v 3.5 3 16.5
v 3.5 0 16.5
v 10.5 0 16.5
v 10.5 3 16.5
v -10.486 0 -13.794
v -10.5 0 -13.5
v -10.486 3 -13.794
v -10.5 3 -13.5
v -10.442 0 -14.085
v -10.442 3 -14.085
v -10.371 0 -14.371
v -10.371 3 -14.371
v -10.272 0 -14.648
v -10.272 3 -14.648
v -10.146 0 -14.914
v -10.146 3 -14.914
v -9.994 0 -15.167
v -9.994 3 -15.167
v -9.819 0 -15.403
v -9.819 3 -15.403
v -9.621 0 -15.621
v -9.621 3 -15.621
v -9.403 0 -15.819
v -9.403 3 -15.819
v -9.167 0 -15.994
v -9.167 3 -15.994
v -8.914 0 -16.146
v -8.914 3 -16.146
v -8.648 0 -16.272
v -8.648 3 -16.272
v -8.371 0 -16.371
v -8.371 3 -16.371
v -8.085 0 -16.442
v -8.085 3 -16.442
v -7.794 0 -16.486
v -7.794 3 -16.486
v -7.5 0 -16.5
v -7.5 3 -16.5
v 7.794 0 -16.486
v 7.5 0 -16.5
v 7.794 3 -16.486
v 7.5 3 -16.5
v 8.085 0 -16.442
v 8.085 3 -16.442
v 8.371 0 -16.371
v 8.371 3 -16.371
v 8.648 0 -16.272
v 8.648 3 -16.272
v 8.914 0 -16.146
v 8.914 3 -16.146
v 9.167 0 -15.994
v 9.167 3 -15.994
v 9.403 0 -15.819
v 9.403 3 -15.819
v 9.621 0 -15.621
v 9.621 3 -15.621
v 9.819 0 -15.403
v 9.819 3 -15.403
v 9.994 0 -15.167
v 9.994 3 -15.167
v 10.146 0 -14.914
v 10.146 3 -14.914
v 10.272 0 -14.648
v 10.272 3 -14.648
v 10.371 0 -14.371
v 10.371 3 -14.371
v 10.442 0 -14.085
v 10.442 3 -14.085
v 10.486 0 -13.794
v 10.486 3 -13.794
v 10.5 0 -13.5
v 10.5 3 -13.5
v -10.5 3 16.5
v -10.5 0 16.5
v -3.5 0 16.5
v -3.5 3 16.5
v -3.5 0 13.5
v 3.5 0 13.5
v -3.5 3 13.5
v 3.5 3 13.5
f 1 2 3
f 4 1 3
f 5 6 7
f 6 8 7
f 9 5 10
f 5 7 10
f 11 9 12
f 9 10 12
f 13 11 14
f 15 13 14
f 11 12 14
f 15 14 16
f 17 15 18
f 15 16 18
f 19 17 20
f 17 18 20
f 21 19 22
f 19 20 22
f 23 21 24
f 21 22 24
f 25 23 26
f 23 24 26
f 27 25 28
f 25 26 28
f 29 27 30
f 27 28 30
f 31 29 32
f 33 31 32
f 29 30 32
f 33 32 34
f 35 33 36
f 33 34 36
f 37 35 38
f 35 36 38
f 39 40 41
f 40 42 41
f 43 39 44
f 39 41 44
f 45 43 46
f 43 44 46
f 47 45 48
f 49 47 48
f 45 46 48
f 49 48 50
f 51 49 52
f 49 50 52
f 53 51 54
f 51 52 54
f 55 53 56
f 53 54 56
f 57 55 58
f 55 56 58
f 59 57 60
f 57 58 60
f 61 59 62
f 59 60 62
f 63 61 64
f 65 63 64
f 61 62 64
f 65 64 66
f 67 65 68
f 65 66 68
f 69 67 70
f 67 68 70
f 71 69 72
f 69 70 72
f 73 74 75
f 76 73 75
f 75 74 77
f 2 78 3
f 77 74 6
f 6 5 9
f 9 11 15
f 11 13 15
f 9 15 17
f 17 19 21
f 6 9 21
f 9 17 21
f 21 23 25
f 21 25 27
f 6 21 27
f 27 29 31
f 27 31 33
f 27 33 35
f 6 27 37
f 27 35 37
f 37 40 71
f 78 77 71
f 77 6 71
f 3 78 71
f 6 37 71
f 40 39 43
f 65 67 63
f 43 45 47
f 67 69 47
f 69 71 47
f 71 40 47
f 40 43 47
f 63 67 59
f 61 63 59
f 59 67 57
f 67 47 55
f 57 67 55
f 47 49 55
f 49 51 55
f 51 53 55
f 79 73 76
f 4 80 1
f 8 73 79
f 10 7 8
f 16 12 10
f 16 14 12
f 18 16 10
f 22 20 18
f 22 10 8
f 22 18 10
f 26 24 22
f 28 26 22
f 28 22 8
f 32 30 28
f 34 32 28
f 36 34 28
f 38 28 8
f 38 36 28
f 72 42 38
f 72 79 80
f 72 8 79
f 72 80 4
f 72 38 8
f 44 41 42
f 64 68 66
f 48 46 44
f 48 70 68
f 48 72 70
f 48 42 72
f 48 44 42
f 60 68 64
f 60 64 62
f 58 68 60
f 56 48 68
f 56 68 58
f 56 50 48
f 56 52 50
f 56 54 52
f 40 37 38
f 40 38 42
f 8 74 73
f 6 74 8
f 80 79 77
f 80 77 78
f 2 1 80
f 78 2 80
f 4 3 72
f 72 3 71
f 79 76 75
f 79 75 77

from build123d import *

# Parameters (mm, degrees)
SKETCH2_W           = 21
SKETCH2_H           = 33
BOSS_EXTRUDE1_DEPTH = 3
SKETCH4_W           = 7
SKETCH4_H           = 3
CUT_EXTRUDE2_DEPTH  = 3
FILLET1_R           = 3
FILLET2_R           = 3


with BuildPart() as part:
    # Sketch2 → Boss-Extrude1 (new body)
    with BuildSketch(Plane(origin=(0, 0, 0), x_dir=(1, 0, 0), z_dir=(0, 1, 0))):
        Rectangle(SKETCH2_W, SKETCH2_H)
    extrude(amount=BOSS_EXTRUDE1_DEPTH)

    # Sketch4 → Cut-Extrude2 (cut)
    with BuildSketch(Plane(origin=(0, 3, 0), x_dir=(1, 0, 0), z_dir=(0, 1, 0))):
        with Locations((0, -15)):
            Rectangle(SKETCH4_W, SKETCH4_H)
    extrude(amount=-CUT_EXTRUDE2_DEPTH, mode=Mode.SUBTRACT)

    # Fillet1
    fillet1_edges = [part.edges().sort_by_distance(p)[0] for p in [
        (-10.5, 1.5, -16.5),
    ]]
    fillet(fillet1_edges, radius=FILLET1_R)

    # Fillet2
    fillet2_edges = [part.edges().sort_by_distance(p)[0] for p in [
        (10.5, 1.5, -16.5),
    ]]
    fillet(fillet2_edges, radius=FILLET2_R)


solid = part.part
